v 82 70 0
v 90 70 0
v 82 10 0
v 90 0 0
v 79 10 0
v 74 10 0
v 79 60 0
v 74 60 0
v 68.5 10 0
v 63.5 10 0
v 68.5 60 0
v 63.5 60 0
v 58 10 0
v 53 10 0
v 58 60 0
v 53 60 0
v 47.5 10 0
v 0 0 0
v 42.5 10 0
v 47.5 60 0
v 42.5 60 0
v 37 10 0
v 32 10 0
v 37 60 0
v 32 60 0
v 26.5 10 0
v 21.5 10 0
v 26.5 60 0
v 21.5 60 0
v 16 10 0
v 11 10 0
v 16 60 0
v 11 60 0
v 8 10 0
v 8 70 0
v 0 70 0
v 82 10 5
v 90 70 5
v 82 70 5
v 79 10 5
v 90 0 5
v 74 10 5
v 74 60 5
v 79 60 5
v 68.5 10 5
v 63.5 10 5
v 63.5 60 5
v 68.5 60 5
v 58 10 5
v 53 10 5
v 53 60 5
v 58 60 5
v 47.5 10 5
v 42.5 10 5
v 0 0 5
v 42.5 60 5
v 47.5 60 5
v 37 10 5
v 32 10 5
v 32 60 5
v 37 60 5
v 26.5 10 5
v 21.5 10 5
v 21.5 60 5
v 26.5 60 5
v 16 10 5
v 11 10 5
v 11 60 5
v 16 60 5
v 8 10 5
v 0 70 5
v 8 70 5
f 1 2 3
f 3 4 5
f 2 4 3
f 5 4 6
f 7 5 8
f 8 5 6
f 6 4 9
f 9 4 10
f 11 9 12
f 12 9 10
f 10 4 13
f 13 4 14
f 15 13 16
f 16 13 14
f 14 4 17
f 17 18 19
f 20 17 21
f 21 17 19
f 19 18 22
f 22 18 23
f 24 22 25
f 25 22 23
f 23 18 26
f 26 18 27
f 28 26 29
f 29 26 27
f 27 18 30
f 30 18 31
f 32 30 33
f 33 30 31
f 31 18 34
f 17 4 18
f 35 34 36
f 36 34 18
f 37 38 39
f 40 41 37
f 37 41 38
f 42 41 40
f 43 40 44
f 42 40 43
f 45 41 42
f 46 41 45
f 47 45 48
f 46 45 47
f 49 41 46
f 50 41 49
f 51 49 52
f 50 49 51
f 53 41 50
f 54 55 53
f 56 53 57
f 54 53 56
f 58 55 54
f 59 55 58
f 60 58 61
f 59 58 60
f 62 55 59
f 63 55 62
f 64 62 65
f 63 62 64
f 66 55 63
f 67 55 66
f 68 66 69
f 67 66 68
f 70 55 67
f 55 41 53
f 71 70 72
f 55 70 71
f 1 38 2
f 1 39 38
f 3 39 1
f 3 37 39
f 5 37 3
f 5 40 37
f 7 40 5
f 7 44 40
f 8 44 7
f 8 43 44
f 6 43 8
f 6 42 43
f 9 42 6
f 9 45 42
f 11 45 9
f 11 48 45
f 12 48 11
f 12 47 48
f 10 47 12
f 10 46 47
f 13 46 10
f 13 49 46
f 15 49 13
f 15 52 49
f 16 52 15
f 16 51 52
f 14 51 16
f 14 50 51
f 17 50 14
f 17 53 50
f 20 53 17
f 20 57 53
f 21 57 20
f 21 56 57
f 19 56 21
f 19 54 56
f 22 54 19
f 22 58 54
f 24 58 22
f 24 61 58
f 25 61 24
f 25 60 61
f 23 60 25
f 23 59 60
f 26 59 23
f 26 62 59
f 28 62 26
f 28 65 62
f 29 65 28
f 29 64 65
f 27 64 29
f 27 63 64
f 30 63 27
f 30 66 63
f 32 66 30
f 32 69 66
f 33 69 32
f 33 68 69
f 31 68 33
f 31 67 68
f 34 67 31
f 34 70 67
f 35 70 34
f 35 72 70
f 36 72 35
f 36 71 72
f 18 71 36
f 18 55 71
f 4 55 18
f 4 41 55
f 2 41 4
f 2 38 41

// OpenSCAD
$fn = 32;

// ----------------------------------------------------------------------
// Guard grille: 7 slats over a 90 x 70 mm plate
// ----------------------------------------------------------------------

// --- parameters (mm) ---
profile_height = 5;       // extrusion height
profile_points = 36;      // points of the closed outline

profile = [[0, 0], [90, 0], [90, 70], [82, 70], [82, 10], [79, 10], [79, 60], [74, 60], [74, 10], [68.5, 10], [68.5, 60], [63.5, 60], [63.5, 10], [58, 10], [58, 60], [53, 60], [53, 10], [47.5, 10], [47.5, 60], [42.5, 60], [42.5, 10], [37, 10], [37, 60], [32, 60], [32, 10], [26.5, 10], [26.5, 60], [21.5, 60], [21.5, 10], [16, 10], [16, 60], [11, 60], [11, 10], [8, 10], [8, 70], [0, 70]];  // single closed polygon, 36 points, counter clockwise

// --- the one profile operation ---
linear_extrude(height = profile_height) polygon(points = profile);
